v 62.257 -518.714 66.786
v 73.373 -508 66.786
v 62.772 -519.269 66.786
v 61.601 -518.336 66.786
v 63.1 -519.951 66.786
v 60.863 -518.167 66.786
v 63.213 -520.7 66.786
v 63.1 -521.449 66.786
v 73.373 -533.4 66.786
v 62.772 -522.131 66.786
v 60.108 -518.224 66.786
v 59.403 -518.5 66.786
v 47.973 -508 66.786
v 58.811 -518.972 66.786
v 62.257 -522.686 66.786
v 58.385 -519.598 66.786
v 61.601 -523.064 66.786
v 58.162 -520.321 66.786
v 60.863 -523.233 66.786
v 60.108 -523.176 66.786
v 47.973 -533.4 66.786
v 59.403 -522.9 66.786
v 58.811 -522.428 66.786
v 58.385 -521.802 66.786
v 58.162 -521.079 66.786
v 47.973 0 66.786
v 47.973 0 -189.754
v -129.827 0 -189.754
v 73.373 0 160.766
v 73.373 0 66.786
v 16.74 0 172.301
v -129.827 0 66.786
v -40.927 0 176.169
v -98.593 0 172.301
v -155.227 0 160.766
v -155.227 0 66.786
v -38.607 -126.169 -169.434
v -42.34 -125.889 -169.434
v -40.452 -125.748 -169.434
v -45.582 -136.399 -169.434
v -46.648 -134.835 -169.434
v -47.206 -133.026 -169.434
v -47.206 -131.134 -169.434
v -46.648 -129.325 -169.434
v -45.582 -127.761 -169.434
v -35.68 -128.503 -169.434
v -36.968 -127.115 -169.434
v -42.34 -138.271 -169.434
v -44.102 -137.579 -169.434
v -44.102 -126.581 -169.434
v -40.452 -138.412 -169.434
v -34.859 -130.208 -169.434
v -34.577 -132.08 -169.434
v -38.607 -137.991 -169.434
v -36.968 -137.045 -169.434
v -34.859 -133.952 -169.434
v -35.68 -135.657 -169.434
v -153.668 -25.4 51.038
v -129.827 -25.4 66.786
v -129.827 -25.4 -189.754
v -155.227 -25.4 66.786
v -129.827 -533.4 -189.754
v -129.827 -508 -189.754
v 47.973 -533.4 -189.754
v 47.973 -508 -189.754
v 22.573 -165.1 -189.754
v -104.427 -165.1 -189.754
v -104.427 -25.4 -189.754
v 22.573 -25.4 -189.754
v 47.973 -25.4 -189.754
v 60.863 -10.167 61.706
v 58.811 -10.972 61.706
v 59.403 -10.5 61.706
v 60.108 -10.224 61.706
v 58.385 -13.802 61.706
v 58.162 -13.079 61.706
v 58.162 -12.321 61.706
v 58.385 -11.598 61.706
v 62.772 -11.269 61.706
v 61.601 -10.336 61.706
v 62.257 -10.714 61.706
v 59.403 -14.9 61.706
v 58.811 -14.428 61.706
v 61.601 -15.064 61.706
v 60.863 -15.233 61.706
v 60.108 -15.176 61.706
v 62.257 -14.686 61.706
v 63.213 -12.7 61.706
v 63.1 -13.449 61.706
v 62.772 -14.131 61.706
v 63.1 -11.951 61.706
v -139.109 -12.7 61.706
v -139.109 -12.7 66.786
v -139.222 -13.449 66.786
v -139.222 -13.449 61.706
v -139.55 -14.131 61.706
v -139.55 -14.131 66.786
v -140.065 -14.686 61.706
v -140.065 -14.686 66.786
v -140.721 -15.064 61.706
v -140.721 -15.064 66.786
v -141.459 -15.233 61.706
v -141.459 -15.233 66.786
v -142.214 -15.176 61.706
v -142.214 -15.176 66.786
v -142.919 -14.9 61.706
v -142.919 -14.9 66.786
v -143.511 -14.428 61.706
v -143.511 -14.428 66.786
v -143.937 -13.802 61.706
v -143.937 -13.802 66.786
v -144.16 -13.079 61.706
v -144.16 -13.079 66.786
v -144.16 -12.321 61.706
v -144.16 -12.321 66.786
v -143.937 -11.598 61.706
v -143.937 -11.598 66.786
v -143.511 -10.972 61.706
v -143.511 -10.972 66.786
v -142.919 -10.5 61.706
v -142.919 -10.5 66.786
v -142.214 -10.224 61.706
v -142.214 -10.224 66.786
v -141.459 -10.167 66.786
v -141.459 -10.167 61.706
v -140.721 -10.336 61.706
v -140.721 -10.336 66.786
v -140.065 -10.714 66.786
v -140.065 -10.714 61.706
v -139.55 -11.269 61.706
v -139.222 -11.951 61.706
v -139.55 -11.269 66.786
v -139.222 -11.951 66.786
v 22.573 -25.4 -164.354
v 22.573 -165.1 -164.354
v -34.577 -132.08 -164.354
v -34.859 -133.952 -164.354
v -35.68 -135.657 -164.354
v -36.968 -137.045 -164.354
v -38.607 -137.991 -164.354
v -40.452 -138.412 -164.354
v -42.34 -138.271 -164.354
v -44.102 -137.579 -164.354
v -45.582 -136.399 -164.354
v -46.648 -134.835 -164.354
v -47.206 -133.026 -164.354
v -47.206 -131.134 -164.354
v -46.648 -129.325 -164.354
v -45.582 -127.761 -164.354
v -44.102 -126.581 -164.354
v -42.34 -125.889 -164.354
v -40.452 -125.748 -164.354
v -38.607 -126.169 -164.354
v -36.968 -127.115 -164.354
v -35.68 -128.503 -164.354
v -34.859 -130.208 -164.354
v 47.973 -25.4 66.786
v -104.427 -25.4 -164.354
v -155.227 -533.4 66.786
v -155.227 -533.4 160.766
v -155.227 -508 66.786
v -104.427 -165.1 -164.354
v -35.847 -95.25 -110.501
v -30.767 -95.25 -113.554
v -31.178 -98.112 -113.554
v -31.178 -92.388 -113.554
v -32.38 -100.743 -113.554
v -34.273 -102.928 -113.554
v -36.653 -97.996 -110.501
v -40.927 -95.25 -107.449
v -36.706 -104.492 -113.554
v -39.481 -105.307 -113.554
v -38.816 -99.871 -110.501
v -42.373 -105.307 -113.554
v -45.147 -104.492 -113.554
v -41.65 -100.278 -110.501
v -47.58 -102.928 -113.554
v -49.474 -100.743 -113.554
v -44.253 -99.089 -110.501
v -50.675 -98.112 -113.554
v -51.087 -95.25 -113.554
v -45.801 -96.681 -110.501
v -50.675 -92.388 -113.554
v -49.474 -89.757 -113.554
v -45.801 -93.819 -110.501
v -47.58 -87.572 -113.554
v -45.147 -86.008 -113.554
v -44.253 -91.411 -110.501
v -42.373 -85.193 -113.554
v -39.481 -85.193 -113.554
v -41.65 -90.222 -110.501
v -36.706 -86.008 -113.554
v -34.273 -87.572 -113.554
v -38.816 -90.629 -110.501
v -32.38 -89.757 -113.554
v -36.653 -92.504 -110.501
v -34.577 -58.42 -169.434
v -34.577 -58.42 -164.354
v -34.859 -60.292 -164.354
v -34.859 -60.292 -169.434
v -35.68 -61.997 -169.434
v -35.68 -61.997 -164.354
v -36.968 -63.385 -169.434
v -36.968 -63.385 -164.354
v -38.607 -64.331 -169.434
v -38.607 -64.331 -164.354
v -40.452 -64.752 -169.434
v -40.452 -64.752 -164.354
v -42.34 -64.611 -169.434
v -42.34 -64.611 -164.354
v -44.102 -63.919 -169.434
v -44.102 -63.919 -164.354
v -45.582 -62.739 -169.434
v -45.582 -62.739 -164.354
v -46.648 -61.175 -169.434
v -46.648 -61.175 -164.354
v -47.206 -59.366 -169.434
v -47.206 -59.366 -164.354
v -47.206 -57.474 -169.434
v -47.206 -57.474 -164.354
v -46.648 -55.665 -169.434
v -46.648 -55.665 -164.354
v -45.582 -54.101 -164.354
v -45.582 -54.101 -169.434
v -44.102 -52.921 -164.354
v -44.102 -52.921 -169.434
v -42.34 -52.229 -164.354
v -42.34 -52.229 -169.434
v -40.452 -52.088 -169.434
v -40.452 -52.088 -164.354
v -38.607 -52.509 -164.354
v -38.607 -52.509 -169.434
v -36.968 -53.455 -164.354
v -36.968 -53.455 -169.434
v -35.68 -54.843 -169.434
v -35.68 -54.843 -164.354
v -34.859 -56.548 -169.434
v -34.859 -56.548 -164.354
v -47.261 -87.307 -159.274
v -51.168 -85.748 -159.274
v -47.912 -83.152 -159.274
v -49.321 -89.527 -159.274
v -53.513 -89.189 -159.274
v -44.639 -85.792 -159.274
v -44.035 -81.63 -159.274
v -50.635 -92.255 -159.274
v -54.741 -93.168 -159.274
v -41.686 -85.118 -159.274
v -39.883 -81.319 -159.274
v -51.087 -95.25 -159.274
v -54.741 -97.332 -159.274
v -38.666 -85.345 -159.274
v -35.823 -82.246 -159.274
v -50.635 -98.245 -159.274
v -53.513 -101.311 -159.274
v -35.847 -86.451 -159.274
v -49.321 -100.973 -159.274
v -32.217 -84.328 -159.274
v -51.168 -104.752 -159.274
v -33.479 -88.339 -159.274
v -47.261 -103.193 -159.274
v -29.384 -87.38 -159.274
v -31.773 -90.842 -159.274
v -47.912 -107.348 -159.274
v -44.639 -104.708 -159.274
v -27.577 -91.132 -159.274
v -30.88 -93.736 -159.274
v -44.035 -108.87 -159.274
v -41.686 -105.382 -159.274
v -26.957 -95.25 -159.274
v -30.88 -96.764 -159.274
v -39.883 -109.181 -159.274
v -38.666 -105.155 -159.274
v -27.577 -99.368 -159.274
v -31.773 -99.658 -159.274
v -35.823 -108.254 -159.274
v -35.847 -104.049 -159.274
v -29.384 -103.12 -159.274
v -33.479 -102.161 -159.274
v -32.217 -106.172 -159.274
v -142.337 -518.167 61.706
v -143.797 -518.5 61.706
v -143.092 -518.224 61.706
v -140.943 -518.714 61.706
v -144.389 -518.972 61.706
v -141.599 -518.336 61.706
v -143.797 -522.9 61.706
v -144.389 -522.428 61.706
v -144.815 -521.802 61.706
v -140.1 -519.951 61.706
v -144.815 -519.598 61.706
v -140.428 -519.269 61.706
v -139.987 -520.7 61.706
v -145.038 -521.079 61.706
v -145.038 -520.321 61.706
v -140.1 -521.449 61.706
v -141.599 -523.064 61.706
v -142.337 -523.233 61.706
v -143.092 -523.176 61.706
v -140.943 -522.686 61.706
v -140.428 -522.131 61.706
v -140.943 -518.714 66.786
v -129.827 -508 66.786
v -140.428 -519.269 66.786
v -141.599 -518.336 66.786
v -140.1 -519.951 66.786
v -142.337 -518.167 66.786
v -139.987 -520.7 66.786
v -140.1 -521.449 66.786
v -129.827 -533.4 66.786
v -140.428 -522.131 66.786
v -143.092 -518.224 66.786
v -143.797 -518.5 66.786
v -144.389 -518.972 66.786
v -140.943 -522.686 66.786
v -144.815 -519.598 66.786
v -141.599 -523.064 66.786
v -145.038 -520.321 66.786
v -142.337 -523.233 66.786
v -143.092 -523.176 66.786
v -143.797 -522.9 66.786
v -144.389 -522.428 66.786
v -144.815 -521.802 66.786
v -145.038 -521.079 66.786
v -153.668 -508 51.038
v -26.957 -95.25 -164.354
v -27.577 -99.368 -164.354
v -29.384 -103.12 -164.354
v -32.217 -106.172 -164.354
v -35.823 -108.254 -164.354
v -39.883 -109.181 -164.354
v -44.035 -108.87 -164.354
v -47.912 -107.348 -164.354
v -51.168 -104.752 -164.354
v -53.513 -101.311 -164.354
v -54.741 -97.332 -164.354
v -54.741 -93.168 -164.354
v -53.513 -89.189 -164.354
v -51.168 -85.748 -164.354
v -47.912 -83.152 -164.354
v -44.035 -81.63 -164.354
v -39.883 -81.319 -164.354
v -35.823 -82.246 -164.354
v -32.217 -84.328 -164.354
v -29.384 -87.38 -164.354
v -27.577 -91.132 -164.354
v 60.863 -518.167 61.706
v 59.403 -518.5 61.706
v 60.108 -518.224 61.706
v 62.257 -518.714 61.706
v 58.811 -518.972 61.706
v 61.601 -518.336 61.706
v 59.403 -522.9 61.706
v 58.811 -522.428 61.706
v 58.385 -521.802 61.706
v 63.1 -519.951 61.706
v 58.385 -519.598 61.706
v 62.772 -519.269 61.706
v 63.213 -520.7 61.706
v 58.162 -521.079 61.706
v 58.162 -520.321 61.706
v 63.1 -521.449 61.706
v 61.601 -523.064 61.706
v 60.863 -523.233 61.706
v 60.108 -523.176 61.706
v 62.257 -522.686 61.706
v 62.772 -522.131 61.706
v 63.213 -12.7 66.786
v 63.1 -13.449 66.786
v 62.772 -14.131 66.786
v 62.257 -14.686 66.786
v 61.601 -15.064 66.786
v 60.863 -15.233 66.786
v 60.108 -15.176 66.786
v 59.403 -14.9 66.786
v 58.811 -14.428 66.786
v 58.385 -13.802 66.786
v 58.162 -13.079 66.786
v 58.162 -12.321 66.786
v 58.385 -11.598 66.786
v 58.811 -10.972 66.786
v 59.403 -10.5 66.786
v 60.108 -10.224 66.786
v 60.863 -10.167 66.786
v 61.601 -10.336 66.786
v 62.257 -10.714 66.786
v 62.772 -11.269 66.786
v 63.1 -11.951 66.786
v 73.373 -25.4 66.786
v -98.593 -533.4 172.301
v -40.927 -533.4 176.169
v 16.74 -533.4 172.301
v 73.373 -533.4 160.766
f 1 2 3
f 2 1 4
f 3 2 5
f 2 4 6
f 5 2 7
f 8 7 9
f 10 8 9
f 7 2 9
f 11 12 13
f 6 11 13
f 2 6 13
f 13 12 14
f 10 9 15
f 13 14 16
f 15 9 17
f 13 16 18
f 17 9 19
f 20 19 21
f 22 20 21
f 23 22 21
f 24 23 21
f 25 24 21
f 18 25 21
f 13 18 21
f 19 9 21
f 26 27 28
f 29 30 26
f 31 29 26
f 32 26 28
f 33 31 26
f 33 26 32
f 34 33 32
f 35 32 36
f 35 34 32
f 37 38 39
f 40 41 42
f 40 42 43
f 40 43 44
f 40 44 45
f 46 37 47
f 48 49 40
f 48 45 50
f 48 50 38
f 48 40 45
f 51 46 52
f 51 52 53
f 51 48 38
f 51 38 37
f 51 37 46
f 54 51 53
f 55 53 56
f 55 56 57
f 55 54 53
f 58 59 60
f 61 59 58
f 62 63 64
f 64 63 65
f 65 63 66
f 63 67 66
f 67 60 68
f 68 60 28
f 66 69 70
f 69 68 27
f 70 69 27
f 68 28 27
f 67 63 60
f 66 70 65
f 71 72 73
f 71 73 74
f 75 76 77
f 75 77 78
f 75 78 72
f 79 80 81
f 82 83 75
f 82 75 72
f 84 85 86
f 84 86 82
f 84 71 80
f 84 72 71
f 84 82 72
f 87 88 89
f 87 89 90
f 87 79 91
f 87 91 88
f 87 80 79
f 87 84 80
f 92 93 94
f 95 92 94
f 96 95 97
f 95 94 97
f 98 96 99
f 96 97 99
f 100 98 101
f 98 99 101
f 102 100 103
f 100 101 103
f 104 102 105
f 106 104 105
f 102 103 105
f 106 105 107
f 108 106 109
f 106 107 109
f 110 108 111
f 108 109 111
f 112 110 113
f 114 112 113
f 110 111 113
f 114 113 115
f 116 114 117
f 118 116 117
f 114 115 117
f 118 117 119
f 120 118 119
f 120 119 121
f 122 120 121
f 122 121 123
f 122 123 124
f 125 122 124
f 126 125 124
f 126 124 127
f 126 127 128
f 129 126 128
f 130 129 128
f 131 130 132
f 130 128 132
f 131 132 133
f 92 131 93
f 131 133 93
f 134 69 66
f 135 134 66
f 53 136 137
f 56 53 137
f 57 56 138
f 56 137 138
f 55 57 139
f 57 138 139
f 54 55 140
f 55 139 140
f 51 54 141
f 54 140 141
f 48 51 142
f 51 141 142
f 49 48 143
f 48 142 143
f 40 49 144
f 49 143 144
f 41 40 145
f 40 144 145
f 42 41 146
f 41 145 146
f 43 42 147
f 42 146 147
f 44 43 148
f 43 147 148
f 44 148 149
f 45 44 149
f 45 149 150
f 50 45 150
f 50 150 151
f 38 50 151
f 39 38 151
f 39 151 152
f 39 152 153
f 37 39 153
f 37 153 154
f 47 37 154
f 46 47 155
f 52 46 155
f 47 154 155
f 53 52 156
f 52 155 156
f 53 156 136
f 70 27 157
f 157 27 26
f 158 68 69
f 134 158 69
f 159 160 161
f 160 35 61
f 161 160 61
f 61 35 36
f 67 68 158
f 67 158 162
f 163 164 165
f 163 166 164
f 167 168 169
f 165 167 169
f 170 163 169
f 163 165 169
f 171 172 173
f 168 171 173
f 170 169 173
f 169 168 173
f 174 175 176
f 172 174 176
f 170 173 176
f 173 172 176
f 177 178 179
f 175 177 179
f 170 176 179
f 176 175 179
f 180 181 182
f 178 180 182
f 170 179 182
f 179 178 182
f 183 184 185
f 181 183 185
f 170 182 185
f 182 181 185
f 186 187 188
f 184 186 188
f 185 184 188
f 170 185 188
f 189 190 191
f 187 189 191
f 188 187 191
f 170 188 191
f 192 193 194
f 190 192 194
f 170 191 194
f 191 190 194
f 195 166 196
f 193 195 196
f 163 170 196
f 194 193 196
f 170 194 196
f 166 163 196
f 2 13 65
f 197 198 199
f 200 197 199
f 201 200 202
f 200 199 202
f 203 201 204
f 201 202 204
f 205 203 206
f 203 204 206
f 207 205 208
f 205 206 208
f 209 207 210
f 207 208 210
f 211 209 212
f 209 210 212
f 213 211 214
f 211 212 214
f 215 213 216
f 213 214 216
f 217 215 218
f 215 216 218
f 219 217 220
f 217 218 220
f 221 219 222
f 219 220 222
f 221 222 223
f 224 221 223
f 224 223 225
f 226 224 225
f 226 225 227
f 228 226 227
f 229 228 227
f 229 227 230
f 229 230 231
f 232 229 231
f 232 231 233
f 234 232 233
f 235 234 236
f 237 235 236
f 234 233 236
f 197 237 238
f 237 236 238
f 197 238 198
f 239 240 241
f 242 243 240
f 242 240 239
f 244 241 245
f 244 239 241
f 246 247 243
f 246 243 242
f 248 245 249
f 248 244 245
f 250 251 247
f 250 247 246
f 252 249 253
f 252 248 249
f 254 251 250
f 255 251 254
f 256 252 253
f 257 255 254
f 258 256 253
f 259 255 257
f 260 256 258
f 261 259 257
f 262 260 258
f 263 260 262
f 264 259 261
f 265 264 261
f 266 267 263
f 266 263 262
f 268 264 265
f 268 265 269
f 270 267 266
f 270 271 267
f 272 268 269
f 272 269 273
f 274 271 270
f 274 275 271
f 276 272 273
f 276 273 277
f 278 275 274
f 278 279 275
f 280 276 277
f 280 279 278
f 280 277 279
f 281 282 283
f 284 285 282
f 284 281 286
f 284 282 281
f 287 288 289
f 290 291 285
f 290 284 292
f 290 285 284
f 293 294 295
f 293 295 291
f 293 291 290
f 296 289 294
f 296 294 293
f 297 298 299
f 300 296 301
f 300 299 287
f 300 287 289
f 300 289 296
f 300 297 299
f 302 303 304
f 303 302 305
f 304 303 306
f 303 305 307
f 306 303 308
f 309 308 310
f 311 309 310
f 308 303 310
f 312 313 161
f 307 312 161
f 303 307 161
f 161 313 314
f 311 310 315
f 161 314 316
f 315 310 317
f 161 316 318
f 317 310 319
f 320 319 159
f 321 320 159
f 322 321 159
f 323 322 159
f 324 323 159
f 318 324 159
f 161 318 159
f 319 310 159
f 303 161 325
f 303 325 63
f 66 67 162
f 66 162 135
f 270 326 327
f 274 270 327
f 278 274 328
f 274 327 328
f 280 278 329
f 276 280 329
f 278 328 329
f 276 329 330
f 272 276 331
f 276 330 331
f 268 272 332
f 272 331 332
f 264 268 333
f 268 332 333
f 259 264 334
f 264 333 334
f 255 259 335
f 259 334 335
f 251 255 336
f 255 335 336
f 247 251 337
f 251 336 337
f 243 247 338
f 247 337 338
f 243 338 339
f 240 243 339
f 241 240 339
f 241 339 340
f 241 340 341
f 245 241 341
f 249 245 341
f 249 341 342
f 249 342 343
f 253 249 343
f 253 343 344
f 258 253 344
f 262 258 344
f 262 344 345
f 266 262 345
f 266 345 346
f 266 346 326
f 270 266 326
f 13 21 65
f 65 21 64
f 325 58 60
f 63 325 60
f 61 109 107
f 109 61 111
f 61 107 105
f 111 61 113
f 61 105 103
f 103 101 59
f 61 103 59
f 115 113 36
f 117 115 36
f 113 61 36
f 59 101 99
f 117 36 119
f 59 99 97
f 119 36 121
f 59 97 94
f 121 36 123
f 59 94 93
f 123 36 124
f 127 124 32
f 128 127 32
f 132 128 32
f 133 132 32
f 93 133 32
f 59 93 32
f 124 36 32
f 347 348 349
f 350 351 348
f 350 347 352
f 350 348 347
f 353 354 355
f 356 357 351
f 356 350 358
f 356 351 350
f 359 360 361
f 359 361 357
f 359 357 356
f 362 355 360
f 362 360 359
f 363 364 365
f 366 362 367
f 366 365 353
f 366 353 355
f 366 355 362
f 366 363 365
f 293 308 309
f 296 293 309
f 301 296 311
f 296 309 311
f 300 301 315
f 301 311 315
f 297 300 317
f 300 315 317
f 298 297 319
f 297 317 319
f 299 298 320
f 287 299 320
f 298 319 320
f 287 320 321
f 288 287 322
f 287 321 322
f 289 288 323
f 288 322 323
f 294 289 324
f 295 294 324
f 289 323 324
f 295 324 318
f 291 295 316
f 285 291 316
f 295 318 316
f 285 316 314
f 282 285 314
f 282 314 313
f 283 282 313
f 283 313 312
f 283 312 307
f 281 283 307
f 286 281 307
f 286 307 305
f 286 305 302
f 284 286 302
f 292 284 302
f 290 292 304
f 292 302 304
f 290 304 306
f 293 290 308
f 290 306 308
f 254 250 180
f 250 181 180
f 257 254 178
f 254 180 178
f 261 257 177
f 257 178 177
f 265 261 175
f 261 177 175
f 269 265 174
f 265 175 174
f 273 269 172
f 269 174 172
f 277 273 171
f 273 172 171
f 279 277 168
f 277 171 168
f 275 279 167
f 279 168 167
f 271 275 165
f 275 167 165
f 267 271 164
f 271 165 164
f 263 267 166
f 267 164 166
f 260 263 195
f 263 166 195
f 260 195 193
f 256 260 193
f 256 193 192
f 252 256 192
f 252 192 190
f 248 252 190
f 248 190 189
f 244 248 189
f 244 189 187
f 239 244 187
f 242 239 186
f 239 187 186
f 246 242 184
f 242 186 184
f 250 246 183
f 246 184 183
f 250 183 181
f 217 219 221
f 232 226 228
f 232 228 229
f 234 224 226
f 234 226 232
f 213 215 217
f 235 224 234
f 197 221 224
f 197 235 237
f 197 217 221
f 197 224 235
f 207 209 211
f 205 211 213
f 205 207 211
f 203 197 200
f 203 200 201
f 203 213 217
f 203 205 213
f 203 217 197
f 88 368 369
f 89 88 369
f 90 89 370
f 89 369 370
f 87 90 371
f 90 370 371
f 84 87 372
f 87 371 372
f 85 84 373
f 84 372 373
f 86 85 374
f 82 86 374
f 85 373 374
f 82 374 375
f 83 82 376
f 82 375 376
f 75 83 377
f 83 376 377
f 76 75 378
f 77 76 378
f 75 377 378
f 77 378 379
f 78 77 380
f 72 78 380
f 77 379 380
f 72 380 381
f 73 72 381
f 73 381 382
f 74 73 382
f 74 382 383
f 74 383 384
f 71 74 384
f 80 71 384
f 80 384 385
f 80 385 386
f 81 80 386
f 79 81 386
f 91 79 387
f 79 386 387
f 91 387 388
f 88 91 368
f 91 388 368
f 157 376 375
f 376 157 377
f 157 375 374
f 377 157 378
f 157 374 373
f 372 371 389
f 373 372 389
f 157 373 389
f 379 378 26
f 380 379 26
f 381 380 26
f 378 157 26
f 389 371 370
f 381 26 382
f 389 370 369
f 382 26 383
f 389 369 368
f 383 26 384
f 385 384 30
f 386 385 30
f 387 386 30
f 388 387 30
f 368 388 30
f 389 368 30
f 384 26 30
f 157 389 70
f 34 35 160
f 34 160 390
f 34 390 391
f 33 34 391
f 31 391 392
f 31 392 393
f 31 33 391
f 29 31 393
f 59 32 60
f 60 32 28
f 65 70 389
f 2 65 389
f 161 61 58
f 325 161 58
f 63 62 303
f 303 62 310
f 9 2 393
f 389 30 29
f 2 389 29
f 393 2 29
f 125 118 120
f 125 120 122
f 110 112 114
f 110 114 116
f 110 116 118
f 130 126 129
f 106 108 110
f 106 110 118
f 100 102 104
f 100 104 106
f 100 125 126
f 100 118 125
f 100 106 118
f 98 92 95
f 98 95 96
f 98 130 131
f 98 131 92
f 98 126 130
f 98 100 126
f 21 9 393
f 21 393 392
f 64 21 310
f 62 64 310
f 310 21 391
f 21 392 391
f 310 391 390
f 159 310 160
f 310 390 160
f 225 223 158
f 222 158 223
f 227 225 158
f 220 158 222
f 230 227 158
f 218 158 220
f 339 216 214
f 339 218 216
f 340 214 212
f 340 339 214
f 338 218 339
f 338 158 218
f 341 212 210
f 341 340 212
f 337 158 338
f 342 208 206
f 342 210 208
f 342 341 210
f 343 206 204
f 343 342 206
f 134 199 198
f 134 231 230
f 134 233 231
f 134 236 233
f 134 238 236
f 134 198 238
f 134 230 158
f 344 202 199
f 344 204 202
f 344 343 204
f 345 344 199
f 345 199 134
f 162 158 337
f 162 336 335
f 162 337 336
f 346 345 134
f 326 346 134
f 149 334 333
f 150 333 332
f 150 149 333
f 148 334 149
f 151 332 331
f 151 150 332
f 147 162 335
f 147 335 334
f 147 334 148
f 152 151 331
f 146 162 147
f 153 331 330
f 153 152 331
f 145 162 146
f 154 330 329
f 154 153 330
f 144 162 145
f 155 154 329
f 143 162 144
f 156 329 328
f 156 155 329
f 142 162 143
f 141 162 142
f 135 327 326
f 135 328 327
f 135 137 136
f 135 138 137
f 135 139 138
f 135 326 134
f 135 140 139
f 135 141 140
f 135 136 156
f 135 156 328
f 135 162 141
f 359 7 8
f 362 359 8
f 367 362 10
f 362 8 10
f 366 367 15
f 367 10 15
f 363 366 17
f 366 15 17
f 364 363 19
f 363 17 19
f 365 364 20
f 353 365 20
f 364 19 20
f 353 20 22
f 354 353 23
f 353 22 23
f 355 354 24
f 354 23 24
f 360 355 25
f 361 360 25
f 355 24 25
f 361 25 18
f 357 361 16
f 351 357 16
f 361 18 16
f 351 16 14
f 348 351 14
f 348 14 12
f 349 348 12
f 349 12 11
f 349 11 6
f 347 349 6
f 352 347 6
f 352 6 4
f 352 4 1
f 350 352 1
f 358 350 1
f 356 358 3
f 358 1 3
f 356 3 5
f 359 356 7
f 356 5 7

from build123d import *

# Parameters (mm, degrees)
F1_DEPTH        = 533.4
F3_DEPTH        = 25.4
F5_DEPTH        = 25.4
F7_DEPTH        = 25.4
F8_W            = 127
F8_H            = 139.7
F10_DEPTH       = 25.4
F13_D           = 20.32
F13_DEPTH       = 50.8
F13_CBORE_D     = 27.94
F13_CBORE_DEPTH = 5.08
F13_TIP         = 6.1047438893
F14_R           = 6.35
F15_DEPTH       = 5.08
F16_R           = 2.54
F17_DEPTH       = 5.08
F18_R           = 2.54
F19_DEPTH       = 5.08
F20_R           = 2.54
F21_DEPTH       = 5.08
F22_R           = 2.54
F23_DEPTH       = 5.08
F25_DEPTH       = 533.4


with BuildPart() as f1:
    # F0 (on Front) → F1 (new body)
    with BuildSketch(Plane.XZ):
        Polygon((73.373222708, 160.7664102355), (-155.226777292, 160.7664102355), (-155.226777292, 66.7864102355), (-153.6675693713, 51.0384102355), (-129.826777292, 51.0384102355), (-129.826777292, -189.7535897645), (47.973222708, -189.7535897645), (47.973222708, 51.0384102355), (71.8140147872, 51.0384102355), (73.373222708, 66.7864102355), align=None)
        Polygon((-129.826777292, 51.0384102355), (-153.6675693713, 51.0384102355), (-129.826777292, -189.7535897645), align=None)
        Polygon((47.973222708, -189.7535897645), (71.8140147872, 51.0384102355), (47.973222708, 51.0384102355), align=None)
    extrude(amount=F1_DEPTH)

    # F2 (on face) → F3 (cut)
    with BuildSketch(Plane.XZ.offset(533.4)):
        Polygon((-129.826777292, 66.7864102355), (-155.226777292, 66.7864102355), (-129.826777292, -189.7535897645), align=None)
    extrude(amount=-F3_DEPTH, mode=Mode.SUBTRACT)

    # F4 (on face) → F5 (cut)
    with BuildSketch(Plane.XZ.offset(533.4)):
        Polygon((47.973222708, 66.7864102355), (47.973222708, -189.7535897645), (73.373222708, 66.7864102355), align=None)
    extrude(amount=-F5_DEPTH, mode=Mode.SUBTRACT)

    # F6 (on face) → F7 (cut)
    with BuildSketch(Plane(origin=(0, 0, 0), x_dir=(-1, 0, 0), z_dir=(0, 1, 0))):
        Polygon((-47.973222708, 66.7864102355), (-73.373222708, 66.7864102355), (-47.973222708, -189.7535897645), align=None)
        Polygon((129.826777292, 66.7864102355), (129.826777292, -189.7535897645), (155.226777292, 66.7864102355), align=None)
    extrude(amount=-F7_DEPTH, mode=Mode.SUBTRACT)

    # F8 (on face) → F10 (cut)
    with BuildSketch(Plane(origin=(0, 0, -189.7535897645), x_dir=(1, 0, 0), z_dir=(0, 0, -1))):
        with Locations((-40.926777292, 95.25)):
            Rectangle(F8_W, F8_H)
    extrude(amount=-F10_DEPTH, mode=Mode.SUBTRACT)

    # F13
    with Locations(Plane(origin=(0, 0, -164.3535897645), x_dir=(1, 0, 0), z_dir=(0, 0, -1))):
        with Locations((-40.926777292, 95.25)):
            CounterBoreHole(F13_D / 2, F13_CBORE_D / 2, F13_CBORE_DEPTH, depth=F13_DEPTH)
            with Locations((0, 0, -(F13_DEPTH + F13_TIP / 2))):  # 118° drill point
                Cone(0, F13_D / 2, F13_TIP, mode=Mode.SUBTRACT)

    # F14 (on offset) → F15 (join)
    with BuildSketch(Plane(origin=(0, 0, -164.3535897645), x_dir=(1, 0, 0), z_dir=(0, 0, -1))):
        with Locations((-40.926777292, 132.08)):
            Circle(F14_R)
        with Locations((-40.926777292, 58.42)):
            Circle(F14_R)
    extrude(amount=F15_DEPTH)

    # F16 (on face) → F17 (join)
    with BuildSketch(Plane(origin=(0, 0, 66.7864102355), x_dir=(1, 0, 0), z_dir=(0, 0, -1))):
        with Locations((60.673222708, 12.7)):
            Circle(F16_R)
    extrude(amount=F17_DEPTH)

    # F18 (on face) → F19 (join)
    with BuildSketch(Plane(origin=(0, 0, 66.7864102355), x_dir=(1, 0, 0), z_dir=(0, 0, -1))):
        with Locations((-141.6487544775, 12.7)):
            Circle(F18_R)
    extrude(amount=F19_DEPTH)

    # F20 (on face) → F21 (join)
    with BuildSketch(Plane(origin=(0, 0, 66.7864102355), x_dir=(1, 0, 0), z_dir=(0, 0, -1))):
        with Locations((60.673222708, 520.7)):
            Circle(F20_R)
    extrude(amount=F21_DEPTH)

    # F22 (on face) → F23 (join)
    with BuildSketch(Plane(origin=(0, 0, 66.7864102355), x_dir=(1, 0, 0), z_dir=(0, 0, -1))):
        with Locations((-142.526777292, 520.7)):
            Circle(F22_R)
    extrude(amount=F23_DEPTH)

    # F24 (on face) → F25 (join)
    with BuildSketch(Plane(origin=(0, 0, 0), x_dir=(-1, 0, 0), z_dir=(0, 1, 0))):
        with BuildLine():
            Line((-73.373222708, 160.7664102355), (155.226777292, 160.7664102355))
            ThreePointArc((155.226777292, 160.7664102355), (40.926777292, 176.1690639423), (-73.373222708, 160.7664102355))
        make_face()
    extrude(amount=-F25_DEPTH)


solid = f1.part
